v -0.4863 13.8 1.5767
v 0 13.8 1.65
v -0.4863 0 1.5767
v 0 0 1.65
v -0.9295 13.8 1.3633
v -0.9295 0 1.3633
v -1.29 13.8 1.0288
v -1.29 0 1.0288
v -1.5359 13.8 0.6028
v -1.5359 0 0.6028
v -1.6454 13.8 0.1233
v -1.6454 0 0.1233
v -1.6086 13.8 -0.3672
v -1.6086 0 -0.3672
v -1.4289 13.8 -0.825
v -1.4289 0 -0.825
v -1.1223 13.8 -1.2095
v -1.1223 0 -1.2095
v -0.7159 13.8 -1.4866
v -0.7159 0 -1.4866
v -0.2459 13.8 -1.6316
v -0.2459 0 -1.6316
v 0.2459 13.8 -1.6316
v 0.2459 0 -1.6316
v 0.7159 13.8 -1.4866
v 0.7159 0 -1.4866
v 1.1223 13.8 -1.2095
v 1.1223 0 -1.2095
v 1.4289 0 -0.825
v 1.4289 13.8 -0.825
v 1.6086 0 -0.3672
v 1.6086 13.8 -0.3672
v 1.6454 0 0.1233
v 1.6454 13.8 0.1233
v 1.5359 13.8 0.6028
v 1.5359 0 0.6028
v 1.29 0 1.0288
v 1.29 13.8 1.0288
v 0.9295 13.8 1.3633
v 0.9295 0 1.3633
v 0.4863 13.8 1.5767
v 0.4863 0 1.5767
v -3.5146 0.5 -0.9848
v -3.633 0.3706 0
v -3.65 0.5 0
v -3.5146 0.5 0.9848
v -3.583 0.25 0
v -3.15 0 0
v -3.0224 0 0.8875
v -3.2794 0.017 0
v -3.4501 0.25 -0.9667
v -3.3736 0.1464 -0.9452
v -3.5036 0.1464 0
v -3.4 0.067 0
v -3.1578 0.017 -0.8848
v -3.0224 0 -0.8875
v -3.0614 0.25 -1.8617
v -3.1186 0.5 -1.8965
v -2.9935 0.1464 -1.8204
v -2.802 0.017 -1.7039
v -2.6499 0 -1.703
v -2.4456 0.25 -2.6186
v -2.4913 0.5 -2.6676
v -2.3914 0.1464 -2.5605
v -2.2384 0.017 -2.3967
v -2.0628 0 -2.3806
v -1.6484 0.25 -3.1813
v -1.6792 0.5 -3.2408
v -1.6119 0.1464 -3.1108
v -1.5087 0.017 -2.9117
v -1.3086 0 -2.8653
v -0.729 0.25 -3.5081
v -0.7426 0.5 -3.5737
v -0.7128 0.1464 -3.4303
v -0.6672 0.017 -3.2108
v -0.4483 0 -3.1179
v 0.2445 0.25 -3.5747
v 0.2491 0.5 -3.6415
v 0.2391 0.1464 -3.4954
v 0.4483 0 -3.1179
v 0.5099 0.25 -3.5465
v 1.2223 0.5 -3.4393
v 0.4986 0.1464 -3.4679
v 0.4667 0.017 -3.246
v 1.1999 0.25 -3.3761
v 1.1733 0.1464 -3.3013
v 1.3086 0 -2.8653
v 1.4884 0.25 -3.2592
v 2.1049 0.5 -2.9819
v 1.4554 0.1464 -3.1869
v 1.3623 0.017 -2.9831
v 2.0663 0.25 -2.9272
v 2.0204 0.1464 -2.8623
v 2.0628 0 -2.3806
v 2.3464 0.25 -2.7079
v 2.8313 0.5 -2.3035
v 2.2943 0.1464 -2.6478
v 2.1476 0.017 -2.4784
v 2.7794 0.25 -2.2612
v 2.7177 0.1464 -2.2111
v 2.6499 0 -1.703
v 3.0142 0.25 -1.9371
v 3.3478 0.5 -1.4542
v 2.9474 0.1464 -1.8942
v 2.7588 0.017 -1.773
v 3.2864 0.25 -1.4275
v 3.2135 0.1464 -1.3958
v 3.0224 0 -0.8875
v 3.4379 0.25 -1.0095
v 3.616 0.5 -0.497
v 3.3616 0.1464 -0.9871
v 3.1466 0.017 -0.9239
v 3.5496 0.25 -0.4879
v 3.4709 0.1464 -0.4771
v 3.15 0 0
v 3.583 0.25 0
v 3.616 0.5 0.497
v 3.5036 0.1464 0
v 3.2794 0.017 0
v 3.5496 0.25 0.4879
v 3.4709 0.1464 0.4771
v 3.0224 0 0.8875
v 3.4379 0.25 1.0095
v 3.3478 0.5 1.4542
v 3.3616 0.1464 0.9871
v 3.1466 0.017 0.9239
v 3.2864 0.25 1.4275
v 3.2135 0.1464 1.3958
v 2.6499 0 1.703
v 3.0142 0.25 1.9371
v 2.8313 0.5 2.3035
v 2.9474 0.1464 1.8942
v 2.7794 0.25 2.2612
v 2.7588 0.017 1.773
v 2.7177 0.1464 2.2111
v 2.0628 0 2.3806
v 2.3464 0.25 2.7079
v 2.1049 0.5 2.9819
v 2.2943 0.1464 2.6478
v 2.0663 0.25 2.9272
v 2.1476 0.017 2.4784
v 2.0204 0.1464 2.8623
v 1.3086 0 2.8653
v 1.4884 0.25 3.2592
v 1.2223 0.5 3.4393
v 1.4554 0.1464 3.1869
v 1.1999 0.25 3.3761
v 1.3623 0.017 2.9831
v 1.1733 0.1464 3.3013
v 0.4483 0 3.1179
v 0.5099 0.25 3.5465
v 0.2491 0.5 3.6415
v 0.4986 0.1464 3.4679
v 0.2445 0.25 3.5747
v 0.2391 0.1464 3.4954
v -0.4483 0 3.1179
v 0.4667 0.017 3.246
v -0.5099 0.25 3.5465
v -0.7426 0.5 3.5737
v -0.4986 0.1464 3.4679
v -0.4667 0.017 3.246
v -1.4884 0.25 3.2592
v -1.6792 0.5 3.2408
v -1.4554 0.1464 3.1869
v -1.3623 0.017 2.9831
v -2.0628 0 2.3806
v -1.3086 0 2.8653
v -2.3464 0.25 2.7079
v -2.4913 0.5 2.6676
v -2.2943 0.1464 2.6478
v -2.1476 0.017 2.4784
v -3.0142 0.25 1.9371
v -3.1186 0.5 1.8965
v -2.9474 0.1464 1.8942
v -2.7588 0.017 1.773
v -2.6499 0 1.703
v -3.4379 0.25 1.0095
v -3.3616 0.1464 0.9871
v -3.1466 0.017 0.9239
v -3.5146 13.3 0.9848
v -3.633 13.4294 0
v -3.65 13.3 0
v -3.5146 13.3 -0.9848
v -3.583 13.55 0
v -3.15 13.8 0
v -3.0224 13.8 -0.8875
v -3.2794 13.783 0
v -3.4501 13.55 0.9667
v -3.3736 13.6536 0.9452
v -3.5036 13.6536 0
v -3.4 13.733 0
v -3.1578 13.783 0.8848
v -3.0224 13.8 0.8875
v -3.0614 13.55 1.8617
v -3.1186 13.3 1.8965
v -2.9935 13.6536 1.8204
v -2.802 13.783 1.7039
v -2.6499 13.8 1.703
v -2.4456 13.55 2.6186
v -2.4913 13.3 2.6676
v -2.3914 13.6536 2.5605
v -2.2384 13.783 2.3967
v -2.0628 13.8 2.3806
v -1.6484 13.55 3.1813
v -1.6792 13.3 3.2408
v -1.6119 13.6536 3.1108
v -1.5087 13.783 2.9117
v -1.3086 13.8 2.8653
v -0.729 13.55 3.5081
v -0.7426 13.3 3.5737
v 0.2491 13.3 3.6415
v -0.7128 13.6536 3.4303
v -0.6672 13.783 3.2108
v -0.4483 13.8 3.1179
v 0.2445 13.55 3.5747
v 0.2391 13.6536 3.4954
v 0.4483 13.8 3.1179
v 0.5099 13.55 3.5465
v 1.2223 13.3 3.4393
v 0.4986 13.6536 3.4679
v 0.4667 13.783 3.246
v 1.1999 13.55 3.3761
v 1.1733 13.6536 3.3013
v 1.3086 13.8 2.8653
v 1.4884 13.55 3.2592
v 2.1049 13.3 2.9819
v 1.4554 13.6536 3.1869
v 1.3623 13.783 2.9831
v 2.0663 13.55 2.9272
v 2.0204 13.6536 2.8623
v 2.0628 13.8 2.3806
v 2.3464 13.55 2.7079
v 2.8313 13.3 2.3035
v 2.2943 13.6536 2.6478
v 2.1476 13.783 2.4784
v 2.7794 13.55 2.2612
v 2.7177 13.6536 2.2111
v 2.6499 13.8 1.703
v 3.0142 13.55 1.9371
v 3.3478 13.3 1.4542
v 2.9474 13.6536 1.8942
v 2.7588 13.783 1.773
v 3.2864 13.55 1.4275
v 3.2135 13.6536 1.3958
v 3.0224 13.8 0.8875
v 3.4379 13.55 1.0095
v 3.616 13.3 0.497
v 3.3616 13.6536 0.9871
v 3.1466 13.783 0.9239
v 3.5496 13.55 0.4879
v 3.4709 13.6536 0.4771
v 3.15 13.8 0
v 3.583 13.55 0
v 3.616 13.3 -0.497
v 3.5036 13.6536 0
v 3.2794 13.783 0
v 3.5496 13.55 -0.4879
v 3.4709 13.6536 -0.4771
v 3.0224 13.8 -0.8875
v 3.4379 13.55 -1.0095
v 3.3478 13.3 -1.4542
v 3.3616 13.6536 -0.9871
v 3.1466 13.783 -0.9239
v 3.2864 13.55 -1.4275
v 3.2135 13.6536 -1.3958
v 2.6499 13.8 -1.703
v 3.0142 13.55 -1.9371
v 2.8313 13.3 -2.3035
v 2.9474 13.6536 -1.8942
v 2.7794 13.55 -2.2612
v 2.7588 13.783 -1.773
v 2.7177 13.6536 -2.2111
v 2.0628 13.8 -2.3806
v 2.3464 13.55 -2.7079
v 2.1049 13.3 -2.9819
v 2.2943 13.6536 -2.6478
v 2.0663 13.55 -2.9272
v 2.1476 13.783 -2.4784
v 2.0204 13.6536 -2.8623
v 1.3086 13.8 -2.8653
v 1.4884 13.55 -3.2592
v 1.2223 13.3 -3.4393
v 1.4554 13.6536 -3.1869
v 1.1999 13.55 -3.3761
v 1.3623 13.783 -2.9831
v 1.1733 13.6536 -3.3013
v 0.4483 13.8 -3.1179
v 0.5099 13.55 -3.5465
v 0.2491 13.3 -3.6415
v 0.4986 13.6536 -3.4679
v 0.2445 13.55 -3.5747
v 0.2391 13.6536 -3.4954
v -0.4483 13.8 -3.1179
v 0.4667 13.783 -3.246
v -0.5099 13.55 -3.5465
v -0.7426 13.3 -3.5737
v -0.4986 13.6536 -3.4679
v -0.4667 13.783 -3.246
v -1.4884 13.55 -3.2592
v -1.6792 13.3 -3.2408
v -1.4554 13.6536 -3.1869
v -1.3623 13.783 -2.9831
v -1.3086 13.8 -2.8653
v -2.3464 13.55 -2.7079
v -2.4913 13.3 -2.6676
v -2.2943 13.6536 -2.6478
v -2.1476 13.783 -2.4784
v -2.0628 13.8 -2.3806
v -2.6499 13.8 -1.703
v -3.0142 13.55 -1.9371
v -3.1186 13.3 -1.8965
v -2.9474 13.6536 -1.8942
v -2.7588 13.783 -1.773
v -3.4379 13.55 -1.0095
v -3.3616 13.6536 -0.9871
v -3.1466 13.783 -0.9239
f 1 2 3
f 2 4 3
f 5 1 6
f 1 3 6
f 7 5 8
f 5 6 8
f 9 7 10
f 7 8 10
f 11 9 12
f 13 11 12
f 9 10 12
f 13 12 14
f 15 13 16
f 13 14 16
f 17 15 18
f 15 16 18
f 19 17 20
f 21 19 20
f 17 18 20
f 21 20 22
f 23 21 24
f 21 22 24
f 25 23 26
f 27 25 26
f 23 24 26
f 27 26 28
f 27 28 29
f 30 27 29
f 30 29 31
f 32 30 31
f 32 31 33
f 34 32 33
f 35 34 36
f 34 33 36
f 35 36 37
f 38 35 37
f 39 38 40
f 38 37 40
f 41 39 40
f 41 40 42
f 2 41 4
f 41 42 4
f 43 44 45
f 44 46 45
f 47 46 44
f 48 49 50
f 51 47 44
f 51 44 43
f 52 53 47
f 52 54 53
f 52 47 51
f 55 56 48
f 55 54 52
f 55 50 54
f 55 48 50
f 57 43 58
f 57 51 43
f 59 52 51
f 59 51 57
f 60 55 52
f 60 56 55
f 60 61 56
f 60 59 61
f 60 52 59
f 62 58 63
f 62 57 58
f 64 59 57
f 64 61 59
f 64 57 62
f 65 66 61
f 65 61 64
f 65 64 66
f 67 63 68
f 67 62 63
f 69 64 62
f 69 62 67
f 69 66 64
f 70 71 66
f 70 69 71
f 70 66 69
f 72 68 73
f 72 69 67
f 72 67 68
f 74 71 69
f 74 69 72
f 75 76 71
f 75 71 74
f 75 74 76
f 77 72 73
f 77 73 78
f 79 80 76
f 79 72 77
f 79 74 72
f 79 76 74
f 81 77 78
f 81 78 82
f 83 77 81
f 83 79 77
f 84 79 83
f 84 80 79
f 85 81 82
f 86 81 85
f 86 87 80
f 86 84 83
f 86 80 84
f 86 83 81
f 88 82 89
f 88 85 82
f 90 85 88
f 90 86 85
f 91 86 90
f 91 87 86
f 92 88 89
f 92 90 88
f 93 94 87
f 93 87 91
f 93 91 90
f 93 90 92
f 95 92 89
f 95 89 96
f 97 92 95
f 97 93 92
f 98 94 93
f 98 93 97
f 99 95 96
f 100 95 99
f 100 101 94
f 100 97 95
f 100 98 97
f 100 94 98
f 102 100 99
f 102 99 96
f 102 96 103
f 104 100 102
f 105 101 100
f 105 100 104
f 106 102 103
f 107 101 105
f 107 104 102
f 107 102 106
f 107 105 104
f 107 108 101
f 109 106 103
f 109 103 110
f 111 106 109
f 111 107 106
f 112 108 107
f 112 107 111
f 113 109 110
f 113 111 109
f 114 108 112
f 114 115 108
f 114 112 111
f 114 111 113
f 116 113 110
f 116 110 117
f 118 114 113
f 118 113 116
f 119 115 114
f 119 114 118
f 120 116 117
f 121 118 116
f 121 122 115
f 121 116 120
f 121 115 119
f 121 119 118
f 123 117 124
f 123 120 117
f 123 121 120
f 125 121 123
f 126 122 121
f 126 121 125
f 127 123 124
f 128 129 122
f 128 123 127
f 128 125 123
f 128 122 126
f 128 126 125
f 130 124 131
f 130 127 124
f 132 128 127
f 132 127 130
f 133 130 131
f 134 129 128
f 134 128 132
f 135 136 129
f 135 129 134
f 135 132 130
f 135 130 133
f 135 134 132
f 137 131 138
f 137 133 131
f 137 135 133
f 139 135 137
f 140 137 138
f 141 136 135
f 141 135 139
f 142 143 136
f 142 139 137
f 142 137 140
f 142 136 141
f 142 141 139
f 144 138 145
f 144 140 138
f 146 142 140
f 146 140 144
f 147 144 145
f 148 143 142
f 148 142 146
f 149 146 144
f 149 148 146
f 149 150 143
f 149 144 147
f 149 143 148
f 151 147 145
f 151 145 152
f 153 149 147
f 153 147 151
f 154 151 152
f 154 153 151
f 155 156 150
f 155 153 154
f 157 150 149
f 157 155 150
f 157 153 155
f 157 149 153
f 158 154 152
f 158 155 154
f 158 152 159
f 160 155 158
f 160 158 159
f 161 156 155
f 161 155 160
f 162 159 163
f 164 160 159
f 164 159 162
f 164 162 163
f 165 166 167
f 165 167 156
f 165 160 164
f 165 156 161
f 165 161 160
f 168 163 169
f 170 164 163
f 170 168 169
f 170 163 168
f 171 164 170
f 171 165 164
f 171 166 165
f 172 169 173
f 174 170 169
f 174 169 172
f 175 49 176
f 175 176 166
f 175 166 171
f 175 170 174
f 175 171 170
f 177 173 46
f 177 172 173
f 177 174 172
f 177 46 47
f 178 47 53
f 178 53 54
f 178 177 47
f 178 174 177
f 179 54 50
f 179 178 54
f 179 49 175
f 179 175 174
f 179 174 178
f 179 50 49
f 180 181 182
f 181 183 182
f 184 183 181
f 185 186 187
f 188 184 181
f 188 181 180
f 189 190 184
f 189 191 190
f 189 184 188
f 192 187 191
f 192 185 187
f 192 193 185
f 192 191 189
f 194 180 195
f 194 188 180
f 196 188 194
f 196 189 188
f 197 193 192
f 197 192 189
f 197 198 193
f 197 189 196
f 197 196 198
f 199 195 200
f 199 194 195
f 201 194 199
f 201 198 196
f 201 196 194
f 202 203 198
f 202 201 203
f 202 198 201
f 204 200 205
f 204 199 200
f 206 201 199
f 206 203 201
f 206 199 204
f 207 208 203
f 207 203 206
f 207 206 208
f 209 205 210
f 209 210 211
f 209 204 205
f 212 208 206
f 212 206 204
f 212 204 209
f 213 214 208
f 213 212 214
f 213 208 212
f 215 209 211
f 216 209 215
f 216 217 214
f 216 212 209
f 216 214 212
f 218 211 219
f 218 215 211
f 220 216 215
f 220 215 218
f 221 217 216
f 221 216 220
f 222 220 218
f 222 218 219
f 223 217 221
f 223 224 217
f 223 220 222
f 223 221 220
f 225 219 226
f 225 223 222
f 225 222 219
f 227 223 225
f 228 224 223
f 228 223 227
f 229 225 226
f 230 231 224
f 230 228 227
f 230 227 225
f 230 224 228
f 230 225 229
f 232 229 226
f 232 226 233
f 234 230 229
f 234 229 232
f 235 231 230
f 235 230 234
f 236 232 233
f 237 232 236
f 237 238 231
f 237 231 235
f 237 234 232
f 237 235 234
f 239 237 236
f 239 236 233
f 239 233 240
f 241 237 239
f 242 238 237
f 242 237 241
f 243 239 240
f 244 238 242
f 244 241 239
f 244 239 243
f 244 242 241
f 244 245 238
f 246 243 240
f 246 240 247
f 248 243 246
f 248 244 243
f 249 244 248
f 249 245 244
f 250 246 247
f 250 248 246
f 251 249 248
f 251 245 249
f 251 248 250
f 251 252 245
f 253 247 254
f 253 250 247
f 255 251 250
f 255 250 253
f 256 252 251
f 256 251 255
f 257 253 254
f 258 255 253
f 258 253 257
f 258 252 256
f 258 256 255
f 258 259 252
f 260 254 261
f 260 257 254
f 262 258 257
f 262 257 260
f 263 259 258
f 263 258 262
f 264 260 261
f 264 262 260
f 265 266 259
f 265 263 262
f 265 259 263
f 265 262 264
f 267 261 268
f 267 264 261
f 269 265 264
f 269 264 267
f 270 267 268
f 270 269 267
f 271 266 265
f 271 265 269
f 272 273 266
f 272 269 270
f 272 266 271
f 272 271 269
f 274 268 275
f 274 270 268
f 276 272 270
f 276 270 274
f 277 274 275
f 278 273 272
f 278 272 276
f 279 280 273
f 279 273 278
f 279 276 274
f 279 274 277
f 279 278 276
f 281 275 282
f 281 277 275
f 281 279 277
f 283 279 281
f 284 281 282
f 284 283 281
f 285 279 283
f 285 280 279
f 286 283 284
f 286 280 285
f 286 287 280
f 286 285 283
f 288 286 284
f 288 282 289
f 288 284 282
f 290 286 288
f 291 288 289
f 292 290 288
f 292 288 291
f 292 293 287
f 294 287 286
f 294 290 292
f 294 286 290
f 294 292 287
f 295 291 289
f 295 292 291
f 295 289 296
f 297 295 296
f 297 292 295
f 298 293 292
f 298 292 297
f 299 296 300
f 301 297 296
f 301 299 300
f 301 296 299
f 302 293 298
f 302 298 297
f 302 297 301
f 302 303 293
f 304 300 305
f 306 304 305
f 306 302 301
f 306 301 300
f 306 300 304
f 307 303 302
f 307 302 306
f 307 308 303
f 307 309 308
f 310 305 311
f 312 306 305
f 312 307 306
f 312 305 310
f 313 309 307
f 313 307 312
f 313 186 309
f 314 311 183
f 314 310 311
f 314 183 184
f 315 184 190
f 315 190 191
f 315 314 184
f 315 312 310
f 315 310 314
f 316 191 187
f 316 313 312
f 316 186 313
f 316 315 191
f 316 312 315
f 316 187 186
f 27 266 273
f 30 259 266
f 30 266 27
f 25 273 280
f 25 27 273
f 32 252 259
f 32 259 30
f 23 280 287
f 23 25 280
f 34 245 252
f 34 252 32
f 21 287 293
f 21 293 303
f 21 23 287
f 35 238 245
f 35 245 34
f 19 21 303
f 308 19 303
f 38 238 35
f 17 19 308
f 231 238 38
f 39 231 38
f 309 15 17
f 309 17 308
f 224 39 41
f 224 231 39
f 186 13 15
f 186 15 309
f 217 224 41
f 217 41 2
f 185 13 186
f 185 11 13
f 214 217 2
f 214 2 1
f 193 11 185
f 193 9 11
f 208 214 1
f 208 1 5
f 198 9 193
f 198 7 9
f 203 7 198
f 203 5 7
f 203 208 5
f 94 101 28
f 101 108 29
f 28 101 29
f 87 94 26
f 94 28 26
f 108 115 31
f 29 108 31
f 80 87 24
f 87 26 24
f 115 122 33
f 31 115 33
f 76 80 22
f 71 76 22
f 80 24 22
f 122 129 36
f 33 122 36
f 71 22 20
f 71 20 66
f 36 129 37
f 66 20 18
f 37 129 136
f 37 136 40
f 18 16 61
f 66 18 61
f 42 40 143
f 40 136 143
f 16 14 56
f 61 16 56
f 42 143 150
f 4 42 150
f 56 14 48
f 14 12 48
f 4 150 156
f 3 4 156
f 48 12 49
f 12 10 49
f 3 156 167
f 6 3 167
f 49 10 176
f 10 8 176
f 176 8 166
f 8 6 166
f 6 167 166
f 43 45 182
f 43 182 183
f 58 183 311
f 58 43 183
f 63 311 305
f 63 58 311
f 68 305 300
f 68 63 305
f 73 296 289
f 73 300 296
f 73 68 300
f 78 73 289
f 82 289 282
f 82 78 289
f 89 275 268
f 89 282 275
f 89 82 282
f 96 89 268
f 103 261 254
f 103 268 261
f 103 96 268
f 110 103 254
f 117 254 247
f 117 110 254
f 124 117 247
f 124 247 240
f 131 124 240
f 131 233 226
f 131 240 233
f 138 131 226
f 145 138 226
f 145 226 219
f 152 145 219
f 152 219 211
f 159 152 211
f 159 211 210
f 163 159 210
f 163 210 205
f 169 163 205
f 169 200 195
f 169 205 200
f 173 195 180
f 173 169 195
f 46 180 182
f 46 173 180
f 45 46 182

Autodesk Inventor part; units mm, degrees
ref_plane "YZ Plane" through (0, 0, 0) normal (1, 0, 0) x (0, 1, 0)
ref_plane "XZ Plane" through (0, 0, 0) normal (0, 1, 0) x (-1, 0, 0)
ref_plane "XY Plane" through (0, 0, 0) normal (0, 0, 1) x (1, 0, 0)
sketch "スケッチ1" plane through (0, 0, 0) normal (0, 1, 0) x (-1, 0, 0)
  circle A0 centre (0, 0) radius 3.65
  dimension "d0" = 7.3
extrude "押し出し1" add sketch "スケッチ1" along normal blind 13.8
sketch "スケッチ2" plane through (0, 13.8, 0) normal (0, 1, 0) x (1, 0, 0)
  point P0 (0, 0)
  point P1 (0, 0)
hole "穴1" at (0, 13.8, 0) direction (0, -1, 0) diameter 3.3 end through all
fillet "フィレット1" radius 0.5 2 edges at (3.65, 0, 0) (3.65, 13.8, 0)
properties part number "spacer_for_frame"
